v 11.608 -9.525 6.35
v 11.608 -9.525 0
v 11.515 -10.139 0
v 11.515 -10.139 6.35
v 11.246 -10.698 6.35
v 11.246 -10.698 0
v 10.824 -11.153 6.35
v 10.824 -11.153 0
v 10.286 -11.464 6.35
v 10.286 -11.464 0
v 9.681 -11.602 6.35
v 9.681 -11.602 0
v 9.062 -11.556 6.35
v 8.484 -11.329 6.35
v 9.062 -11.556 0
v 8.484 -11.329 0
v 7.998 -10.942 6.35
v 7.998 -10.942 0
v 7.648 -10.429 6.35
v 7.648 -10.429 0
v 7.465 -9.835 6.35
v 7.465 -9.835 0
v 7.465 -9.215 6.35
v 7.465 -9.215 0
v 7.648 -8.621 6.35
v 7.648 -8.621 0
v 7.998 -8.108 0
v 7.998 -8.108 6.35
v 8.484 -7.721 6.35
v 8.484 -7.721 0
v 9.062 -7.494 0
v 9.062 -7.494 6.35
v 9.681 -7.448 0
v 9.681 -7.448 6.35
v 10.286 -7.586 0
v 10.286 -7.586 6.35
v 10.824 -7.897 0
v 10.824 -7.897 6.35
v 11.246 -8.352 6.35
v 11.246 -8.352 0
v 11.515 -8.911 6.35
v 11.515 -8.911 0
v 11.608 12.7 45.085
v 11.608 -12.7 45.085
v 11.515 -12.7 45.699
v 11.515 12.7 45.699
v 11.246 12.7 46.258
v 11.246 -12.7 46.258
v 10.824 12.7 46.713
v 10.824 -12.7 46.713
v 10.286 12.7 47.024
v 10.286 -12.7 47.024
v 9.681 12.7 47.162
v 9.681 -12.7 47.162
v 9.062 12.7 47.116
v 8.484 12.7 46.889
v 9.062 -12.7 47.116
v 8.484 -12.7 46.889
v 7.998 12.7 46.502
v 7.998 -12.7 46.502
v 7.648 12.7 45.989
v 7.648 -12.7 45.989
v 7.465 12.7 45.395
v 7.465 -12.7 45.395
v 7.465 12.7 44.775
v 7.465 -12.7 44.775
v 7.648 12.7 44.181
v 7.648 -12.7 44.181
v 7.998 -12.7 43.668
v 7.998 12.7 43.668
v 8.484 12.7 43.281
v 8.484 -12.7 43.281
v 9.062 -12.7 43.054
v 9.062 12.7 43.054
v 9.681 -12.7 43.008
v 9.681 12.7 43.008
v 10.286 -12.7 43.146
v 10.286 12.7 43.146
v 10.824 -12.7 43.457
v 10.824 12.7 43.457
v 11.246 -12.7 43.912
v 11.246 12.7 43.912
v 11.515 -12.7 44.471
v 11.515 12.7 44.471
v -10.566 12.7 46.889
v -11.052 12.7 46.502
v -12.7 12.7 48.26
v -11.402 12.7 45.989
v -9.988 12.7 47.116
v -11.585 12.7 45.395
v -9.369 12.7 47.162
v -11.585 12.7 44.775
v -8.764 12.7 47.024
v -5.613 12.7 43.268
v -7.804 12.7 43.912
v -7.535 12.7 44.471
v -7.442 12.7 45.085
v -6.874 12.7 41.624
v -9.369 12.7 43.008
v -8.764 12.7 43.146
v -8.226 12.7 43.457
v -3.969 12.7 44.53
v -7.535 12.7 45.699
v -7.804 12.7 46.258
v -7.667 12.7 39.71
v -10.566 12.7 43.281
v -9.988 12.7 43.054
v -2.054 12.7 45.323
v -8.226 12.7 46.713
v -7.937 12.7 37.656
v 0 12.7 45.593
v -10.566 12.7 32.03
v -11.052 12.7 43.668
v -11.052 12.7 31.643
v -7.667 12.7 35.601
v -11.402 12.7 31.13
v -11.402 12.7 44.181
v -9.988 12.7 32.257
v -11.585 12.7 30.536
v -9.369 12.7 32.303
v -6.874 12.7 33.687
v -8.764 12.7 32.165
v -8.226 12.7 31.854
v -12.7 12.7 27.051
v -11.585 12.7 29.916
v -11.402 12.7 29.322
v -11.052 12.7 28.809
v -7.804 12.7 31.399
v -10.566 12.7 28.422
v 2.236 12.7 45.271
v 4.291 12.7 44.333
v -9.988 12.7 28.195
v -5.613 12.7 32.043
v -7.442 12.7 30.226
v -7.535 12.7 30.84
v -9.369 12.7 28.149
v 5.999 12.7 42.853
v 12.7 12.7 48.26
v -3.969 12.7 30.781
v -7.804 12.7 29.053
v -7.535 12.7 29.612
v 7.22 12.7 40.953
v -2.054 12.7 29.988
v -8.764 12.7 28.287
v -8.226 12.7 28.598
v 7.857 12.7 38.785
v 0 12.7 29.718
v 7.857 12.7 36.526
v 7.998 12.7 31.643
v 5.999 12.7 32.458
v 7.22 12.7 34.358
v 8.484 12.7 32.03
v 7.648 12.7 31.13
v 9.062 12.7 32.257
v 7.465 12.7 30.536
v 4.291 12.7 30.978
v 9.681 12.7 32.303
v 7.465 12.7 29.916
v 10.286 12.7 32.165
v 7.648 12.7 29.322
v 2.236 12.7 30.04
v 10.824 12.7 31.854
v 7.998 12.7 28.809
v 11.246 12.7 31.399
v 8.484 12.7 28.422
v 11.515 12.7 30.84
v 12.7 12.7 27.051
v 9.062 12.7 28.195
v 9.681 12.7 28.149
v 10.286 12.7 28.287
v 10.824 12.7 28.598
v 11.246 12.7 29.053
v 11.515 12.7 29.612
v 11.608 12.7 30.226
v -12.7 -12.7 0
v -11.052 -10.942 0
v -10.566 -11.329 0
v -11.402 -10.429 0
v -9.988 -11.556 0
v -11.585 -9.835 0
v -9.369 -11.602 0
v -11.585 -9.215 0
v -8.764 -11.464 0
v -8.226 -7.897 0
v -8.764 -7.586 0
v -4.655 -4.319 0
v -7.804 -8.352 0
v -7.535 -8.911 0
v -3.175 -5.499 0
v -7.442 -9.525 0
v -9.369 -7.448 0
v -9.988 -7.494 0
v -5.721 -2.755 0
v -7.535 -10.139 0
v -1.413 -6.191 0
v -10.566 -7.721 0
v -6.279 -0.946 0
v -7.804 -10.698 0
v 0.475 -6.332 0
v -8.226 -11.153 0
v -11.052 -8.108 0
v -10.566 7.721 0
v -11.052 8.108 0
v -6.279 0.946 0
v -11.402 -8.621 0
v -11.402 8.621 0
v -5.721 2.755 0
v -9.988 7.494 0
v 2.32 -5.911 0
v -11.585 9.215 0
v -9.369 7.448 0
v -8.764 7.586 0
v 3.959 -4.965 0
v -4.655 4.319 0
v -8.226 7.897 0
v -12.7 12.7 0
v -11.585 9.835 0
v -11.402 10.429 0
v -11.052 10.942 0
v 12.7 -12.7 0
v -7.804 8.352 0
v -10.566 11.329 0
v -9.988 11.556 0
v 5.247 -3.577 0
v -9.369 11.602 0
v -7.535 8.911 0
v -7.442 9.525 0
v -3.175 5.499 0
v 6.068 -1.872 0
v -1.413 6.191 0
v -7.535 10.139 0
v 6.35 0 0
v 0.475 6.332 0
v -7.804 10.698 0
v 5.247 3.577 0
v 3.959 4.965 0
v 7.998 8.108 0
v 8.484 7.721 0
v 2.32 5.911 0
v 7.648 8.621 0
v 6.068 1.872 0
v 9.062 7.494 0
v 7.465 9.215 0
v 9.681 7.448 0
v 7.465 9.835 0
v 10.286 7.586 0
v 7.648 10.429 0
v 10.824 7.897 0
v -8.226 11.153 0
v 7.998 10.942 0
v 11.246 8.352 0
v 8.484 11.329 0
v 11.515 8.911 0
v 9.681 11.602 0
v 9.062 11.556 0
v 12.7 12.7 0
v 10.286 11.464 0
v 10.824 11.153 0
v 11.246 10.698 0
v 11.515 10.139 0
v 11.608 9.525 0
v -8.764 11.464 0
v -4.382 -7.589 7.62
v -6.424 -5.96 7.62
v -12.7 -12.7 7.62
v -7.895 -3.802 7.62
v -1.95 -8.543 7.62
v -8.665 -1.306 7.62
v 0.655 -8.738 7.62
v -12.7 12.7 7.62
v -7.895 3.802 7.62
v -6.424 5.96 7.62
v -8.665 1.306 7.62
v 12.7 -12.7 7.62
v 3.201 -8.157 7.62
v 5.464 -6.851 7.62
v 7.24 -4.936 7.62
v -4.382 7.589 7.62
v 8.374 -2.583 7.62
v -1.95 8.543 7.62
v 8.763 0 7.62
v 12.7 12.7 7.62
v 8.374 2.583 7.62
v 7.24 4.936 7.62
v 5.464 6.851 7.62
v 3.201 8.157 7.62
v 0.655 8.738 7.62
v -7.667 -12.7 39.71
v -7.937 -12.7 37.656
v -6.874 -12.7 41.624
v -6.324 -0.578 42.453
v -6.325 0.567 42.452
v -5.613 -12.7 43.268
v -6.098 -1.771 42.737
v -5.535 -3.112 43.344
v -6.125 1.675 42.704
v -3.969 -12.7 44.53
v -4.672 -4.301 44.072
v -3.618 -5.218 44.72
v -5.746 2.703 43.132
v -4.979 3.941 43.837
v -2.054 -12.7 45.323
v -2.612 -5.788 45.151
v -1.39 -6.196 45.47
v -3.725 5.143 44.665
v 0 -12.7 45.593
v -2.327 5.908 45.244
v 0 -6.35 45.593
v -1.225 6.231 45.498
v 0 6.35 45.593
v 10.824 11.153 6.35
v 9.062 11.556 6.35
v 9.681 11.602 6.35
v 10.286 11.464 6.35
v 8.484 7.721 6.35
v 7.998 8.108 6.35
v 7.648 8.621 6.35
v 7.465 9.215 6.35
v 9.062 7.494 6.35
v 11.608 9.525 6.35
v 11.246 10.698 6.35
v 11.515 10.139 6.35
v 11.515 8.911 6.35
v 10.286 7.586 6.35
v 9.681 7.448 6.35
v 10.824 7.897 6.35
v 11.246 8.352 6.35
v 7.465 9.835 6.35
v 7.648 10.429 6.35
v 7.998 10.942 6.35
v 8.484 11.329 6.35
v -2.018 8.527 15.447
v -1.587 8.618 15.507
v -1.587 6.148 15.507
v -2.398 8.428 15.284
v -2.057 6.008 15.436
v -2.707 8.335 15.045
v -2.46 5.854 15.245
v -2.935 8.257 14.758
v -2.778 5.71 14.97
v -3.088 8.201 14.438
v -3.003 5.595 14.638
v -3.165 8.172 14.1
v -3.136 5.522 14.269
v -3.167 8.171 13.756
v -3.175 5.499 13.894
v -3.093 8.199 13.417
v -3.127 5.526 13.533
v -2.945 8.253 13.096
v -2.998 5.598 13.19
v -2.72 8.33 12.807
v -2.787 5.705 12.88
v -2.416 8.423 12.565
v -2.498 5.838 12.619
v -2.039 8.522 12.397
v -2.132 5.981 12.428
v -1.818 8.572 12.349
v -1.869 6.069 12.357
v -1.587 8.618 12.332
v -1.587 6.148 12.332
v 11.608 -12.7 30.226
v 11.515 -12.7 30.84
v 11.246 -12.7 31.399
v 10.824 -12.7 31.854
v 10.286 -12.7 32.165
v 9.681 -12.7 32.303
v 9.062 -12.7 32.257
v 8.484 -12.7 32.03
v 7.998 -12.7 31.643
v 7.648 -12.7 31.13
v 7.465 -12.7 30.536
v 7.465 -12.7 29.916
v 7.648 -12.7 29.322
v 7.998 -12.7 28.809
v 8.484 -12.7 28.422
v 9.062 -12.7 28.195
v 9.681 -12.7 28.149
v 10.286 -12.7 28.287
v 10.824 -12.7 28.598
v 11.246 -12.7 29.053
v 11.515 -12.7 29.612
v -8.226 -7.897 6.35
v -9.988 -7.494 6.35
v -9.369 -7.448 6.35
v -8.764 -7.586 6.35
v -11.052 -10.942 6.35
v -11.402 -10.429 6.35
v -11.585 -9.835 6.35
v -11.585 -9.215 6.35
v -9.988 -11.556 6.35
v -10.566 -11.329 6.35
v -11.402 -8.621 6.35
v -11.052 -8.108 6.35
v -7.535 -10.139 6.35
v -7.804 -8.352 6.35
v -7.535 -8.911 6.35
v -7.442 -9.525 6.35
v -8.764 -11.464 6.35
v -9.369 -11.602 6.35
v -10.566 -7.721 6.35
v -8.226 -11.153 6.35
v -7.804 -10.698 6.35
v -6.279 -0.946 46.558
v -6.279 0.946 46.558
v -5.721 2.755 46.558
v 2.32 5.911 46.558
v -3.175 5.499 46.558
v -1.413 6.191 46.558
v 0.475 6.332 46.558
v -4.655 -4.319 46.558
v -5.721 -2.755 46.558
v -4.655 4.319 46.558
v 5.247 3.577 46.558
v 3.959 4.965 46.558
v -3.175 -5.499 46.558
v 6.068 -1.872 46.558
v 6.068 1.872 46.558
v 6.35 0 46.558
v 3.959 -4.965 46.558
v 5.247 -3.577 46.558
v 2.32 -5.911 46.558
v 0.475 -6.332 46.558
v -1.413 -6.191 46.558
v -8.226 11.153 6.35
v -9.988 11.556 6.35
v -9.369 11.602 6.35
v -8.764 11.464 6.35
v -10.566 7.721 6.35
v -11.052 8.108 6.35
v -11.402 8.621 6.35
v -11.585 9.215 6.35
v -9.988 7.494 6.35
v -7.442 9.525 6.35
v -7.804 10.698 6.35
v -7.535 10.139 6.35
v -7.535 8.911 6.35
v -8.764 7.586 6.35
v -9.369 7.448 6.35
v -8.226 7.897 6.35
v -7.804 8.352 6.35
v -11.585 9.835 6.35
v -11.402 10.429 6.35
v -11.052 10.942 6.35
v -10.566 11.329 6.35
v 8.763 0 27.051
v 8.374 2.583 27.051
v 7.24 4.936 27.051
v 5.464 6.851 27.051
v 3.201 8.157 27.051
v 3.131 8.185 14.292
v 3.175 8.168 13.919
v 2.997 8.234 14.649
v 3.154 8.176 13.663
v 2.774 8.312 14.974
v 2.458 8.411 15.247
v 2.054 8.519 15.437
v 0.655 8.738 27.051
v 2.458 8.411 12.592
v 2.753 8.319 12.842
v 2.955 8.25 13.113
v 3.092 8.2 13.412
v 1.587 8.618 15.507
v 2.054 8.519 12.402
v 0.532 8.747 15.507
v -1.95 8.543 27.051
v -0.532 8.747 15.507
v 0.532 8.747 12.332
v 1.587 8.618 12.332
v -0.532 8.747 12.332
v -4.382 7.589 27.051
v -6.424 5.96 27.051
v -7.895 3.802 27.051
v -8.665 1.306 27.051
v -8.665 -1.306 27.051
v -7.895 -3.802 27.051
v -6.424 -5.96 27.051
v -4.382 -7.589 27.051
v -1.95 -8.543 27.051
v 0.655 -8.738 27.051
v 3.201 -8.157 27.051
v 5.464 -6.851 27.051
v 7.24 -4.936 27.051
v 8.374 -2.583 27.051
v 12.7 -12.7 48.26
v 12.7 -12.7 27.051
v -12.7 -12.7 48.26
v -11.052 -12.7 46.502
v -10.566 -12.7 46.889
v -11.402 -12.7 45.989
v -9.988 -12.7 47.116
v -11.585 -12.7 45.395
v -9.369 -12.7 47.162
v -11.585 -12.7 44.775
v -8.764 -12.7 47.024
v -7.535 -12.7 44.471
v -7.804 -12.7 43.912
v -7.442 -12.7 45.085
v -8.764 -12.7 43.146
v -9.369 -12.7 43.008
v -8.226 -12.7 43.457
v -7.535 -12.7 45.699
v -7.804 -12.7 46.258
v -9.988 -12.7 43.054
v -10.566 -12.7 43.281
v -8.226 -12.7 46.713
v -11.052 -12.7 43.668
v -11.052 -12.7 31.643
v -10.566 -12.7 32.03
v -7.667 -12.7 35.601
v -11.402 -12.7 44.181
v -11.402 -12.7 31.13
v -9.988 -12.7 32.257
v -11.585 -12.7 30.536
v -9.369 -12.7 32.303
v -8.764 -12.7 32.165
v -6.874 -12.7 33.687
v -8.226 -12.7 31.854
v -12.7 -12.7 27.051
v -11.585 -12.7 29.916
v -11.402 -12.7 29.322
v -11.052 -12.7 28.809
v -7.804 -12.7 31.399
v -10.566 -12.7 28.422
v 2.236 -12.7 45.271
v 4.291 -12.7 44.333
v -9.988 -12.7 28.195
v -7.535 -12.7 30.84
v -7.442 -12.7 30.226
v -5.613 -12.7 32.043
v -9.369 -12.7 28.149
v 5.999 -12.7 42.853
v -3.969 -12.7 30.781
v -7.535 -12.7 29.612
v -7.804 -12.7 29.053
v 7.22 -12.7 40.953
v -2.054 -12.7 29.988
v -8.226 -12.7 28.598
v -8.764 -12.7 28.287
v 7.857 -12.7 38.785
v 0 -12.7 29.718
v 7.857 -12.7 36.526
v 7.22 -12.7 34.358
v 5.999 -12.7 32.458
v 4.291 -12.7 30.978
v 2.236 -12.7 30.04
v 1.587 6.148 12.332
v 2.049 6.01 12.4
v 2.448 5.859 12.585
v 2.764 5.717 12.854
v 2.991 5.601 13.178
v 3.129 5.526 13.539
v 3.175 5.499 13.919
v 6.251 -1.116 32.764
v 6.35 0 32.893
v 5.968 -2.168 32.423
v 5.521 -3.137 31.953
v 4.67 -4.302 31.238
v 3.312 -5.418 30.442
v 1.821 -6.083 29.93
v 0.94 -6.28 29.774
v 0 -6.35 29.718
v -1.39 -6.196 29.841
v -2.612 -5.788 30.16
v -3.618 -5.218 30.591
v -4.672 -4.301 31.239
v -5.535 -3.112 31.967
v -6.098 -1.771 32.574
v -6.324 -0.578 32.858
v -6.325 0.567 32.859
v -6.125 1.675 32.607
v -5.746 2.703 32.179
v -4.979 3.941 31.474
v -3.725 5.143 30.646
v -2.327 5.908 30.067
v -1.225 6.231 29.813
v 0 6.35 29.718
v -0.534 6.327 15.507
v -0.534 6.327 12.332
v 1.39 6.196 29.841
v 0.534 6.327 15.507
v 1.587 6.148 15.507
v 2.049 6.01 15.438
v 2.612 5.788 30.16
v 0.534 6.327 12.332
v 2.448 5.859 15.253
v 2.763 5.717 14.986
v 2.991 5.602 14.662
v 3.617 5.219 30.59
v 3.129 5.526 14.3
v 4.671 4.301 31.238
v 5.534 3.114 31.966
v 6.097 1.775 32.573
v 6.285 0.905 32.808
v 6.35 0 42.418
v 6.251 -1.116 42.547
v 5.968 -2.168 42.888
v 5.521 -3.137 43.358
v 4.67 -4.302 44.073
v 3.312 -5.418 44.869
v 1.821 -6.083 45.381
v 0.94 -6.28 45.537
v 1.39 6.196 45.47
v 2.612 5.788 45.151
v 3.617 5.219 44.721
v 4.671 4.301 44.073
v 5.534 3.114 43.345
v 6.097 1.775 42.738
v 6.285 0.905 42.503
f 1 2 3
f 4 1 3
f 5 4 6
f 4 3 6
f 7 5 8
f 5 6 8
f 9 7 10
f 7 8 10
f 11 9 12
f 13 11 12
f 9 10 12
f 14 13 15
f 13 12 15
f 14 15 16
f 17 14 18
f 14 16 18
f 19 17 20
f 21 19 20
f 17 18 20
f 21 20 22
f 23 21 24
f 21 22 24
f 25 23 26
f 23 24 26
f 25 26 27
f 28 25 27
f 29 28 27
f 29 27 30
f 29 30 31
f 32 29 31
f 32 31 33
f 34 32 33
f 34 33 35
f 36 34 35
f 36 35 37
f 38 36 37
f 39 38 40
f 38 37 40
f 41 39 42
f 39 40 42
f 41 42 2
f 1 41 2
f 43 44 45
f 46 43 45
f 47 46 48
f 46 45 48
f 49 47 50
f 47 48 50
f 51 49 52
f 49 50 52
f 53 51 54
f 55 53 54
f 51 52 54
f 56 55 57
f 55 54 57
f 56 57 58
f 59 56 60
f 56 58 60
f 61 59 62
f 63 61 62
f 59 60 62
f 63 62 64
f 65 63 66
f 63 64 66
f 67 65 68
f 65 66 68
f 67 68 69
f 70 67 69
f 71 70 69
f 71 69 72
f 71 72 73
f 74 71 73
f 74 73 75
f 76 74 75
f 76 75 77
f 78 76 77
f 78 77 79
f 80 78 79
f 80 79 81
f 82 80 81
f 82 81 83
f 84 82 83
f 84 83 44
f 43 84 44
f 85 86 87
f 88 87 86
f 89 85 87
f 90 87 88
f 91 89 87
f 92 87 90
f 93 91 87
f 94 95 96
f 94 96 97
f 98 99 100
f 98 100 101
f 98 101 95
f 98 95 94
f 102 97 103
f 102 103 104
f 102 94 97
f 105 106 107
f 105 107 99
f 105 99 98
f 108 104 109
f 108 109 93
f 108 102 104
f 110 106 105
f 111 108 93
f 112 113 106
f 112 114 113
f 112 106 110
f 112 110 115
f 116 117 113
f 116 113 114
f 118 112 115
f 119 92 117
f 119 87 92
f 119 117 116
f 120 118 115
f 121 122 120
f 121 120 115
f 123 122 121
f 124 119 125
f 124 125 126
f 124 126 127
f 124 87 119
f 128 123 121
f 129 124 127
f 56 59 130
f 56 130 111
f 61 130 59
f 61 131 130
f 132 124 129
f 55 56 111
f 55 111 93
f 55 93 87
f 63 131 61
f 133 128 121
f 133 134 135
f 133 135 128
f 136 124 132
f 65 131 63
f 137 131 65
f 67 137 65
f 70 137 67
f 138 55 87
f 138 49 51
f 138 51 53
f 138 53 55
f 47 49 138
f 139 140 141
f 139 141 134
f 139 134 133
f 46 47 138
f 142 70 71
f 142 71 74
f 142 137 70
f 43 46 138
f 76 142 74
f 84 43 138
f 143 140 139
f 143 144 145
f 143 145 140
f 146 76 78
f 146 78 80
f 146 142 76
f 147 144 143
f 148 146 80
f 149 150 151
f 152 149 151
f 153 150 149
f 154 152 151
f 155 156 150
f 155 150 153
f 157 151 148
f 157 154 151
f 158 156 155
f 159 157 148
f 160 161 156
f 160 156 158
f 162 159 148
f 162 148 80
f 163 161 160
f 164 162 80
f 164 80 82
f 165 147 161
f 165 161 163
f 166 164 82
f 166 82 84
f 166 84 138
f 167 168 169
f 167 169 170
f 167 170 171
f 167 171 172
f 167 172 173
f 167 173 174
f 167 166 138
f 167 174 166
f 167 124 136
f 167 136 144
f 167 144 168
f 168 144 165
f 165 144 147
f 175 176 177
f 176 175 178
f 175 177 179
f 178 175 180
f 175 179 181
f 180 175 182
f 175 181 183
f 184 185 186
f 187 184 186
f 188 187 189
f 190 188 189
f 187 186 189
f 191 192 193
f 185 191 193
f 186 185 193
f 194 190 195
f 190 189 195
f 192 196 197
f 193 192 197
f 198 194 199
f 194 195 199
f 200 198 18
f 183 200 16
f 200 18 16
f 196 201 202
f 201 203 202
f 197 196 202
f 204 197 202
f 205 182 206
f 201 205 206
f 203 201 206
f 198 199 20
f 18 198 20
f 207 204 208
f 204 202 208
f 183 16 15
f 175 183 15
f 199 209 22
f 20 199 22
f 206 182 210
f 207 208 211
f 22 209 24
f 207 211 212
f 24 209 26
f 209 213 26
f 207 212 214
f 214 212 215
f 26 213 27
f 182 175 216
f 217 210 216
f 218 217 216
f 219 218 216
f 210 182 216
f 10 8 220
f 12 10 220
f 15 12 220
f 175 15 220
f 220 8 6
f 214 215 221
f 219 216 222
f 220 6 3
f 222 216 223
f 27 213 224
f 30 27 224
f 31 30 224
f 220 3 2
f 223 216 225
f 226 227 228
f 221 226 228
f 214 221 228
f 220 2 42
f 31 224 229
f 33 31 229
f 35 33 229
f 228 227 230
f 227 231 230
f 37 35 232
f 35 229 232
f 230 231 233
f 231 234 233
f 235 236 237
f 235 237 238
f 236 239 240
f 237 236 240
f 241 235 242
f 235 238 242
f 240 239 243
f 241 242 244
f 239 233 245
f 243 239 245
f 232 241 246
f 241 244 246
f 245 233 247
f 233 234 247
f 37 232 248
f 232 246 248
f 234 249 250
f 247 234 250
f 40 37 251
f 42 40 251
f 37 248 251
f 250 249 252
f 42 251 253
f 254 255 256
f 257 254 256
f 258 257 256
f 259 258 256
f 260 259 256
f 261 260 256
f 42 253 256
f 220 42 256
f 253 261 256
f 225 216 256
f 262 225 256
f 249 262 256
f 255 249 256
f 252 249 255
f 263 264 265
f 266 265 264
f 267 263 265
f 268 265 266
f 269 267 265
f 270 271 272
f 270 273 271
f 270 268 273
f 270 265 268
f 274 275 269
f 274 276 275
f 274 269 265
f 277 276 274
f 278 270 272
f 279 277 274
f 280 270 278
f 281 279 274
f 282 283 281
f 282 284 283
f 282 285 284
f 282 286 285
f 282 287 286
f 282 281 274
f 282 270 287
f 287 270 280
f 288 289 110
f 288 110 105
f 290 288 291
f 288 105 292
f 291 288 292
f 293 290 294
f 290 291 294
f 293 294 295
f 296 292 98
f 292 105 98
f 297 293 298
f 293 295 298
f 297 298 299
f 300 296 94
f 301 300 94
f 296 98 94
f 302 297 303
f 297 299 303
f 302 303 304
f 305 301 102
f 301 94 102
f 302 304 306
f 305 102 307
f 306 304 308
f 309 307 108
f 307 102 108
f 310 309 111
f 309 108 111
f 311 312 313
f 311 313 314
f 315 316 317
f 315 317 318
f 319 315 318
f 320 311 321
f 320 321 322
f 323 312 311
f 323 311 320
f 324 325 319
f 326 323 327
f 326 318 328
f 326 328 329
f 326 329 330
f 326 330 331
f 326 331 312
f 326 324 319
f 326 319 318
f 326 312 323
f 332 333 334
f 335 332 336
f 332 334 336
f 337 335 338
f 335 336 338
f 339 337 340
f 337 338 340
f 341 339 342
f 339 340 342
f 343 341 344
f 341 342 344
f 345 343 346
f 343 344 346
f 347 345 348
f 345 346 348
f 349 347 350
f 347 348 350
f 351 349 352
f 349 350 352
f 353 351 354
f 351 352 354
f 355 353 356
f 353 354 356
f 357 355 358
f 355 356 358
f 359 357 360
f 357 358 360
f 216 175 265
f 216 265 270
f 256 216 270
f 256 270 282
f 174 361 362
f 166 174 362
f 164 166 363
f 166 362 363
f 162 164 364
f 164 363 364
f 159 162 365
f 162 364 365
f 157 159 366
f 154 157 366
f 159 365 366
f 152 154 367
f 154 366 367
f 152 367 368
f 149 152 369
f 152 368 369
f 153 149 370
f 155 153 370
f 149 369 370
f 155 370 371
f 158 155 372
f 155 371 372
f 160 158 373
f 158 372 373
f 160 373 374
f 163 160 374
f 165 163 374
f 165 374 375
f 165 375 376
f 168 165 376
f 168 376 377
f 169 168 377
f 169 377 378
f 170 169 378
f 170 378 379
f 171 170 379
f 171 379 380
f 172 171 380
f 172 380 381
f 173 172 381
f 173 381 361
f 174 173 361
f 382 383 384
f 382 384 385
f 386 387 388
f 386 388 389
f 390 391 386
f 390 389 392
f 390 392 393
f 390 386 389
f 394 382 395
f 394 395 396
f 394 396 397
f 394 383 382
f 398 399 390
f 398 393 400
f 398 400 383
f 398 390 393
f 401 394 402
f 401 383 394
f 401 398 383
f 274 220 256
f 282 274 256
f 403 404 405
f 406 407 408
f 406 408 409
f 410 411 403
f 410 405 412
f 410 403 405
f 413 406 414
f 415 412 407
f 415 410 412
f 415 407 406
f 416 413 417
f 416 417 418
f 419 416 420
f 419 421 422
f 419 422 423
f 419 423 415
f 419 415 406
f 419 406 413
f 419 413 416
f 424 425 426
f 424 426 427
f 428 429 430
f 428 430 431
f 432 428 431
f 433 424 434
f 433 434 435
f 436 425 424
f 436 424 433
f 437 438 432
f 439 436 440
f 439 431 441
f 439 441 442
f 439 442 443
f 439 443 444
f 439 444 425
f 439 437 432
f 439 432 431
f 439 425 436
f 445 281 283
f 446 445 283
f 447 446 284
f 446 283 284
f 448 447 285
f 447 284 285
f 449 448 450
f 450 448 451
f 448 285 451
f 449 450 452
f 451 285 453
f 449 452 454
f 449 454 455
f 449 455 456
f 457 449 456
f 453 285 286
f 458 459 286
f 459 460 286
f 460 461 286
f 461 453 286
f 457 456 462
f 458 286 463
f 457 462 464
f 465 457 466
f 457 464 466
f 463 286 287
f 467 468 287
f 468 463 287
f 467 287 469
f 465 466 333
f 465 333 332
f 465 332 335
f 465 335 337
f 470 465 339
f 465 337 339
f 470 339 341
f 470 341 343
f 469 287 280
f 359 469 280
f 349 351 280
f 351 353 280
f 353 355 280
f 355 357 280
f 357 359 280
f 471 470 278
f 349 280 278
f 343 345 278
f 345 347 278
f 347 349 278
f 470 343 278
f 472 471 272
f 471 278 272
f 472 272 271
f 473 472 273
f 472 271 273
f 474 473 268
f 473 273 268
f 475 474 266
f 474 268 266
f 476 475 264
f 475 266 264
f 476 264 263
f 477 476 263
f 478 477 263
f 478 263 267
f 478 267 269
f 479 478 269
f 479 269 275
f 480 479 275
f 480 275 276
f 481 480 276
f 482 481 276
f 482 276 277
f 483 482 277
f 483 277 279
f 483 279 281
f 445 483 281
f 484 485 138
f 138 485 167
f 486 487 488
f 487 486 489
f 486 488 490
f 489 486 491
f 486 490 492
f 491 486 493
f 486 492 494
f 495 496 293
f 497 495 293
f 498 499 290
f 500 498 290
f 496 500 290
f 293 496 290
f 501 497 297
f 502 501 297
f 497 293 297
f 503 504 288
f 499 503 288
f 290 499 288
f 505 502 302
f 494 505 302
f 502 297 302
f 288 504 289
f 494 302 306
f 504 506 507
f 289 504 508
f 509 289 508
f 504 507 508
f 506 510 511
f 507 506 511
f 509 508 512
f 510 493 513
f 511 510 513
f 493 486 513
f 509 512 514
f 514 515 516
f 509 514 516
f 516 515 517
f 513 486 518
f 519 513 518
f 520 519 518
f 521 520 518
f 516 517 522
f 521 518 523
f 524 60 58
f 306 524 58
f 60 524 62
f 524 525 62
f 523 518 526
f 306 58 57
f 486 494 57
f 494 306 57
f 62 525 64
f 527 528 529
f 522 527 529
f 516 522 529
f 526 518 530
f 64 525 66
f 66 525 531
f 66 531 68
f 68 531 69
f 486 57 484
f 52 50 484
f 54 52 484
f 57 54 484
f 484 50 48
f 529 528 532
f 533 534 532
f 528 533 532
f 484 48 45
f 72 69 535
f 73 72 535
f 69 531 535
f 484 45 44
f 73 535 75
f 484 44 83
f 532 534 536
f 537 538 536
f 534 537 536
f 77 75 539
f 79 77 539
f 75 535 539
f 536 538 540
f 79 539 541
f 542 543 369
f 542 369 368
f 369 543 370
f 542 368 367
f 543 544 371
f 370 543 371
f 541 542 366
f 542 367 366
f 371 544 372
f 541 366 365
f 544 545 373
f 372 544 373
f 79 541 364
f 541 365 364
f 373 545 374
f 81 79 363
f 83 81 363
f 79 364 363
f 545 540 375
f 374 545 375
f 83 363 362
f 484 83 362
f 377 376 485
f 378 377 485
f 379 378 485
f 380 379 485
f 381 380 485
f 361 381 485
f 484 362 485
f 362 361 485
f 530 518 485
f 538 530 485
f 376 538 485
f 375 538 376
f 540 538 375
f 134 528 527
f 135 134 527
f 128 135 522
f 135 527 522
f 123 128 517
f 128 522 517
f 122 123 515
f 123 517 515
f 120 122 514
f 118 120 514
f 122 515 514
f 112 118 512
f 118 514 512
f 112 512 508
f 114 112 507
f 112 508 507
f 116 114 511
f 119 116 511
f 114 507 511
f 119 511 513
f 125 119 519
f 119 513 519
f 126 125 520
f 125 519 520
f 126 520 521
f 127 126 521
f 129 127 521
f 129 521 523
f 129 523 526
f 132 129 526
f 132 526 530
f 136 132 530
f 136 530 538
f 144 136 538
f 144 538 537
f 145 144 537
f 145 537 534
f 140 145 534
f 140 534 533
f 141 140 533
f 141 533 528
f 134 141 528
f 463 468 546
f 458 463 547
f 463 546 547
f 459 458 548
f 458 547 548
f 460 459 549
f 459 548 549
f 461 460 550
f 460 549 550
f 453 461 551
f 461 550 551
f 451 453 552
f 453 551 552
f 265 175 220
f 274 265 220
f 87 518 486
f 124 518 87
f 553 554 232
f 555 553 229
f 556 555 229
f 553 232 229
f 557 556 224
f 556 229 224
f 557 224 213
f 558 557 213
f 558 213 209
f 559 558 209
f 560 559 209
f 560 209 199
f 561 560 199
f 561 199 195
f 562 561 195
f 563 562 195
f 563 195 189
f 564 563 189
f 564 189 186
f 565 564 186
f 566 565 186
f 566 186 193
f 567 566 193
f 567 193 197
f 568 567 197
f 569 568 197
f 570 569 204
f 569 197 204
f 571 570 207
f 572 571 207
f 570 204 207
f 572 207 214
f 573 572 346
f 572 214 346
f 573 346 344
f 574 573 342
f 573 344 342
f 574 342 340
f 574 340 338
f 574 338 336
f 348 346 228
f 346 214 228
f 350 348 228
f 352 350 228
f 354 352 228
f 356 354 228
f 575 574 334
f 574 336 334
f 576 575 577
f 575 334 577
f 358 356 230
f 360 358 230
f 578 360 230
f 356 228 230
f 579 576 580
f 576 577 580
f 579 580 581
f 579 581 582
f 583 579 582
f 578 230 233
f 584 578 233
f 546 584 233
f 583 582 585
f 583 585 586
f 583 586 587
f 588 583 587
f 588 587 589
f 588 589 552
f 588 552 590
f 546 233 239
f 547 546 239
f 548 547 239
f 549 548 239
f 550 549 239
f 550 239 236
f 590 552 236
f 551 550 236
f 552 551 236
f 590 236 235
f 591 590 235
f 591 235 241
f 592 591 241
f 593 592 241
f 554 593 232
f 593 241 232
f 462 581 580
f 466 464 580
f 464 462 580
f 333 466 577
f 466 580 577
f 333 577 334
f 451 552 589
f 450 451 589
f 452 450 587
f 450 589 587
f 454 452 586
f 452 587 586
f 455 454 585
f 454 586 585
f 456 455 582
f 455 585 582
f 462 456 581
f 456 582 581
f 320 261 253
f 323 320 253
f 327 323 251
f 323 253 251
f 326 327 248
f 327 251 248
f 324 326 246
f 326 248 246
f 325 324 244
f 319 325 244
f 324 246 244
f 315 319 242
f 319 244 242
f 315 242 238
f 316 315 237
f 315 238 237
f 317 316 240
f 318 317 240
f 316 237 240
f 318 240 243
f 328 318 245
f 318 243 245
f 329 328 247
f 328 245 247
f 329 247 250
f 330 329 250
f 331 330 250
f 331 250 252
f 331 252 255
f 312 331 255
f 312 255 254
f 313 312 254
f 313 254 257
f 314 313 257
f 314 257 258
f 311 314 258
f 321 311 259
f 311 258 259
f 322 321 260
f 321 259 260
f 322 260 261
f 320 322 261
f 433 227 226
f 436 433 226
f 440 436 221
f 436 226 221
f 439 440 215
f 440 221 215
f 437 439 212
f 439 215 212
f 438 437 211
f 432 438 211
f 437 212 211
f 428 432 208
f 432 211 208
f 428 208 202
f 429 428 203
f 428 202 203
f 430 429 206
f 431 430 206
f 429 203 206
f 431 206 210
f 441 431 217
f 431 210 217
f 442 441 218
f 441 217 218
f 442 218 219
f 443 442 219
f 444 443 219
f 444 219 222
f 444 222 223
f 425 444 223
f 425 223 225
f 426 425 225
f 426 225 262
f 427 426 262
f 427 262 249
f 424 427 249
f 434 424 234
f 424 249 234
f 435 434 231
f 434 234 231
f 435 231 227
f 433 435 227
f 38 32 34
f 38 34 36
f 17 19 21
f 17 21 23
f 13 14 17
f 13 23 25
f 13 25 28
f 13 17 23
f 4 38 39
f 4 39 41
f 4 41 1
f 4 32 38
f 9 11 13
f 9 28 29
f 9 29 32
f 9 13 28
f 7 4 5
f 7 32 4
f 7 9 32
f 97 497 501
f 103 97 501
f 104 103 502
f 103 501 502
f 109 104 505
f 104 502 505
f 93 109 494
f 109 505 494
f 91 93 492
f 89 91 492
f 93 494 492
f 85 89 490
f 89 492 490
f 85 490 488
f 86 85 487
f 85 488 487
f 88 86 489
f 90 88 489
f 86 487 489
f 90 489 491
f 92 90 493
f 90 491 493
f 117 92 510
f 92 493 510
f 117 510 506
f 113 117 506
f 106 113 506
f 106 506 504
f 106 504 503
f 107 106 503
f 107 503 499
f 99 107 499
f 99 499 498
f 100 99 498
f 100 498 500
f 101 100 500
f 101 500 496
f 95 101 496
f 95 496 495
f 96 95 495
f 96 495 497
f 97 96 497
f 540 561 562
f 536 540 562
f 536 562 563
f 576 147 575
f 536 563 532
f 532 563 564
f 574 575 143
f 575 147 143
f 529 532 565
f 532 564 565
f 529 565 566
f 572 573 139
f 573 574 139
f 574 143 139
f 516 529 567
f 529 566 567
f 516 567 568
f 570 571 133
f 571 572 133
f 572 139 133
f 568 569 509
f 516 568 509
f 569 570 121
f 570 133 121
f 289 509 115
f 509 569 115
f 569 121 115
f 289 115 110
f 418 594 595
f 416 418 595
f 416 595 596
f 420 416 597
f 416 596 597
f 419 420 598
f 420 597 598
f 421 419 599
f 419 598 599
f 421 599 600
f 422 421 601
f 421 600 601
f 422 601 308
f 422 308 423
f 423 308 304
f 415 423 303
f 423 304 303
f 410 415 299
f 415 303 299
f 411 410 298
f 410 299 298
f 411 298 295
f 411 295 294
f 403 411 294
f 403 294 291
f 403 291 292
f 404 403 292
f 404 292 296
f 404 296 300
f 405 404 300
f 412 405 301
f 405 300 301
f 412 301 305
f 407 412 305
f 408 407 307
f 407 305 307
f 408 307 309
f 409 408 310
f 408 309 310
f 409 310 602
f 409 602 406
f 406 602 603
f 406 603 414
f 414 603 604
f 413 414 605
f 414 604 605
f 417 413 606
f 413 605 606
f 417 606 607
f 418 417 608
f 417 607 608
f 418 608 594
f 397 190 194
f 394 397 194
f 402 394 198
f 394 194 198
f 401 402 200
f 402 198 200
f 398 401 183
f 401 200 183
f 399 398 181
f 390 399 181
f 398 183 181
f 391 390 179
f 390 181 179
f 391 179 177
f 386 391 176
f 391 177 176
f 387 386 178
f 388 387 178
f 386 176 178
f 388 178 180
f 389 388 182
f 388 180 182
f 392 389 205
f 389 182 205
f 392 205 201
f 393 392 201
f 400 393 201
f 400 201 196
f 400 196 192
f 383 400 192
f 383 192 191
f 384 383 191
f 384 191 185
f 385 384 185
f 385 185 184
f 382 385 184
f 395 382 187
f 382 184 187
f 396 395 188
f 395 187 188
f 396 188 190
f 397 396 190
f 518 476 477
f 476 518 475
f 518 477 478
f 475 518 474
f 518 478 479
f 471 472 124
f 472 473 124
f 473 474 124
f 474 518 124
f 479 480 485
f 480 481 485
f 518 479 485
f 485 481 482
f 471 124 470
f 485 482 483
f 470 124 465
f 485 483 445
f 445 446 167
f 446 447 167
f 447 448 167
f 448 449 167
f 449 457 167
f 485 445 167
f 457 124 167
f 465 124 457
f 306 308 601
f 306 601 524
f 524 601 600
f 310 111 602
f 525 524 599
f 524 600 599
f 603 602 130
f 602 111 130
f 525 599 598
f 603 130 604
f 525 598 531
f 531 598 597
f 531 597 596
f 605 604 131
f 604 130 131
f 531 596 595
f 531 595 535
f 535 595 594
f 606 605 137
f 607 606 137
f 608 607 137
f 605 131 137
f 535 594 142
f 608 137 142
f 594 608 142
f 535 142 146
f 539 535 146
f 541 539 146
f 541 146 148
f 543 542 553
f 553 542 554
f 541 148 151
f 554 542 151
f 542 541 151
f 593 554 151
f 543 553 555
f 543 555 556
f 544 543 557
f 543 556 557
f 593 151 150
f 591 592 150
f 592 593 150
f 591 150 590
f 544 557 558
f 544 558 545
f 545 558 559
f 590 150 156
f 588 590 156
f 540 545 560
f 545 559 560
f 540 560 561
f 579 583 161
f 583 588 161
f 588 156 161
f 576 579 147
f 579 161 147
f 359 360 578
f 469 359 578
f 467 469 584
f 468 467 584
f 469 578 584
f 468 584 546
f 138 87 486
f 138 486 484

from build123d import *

# Parameters (mm, degrees)
F0_W      = 25.4
F0_H      = 25.4
F1_DEPTH  = 7.62
F2_R      = 8.763
F3_DEPTH  = 19.431
F4_W      = 25.4
F4_H      = 25.4
F5_DEPTH  = 21.209
F6_R      = 6.35
F7_DEPTH  = 46.5582
F8_R      = 2.0828
F9_DEPTH  = 25.401
F11_DEPTH = 25.401
F13_DEPTH = 25.4
F14_R     = 2.0828
F15_DEPTH = 6.35


with BuildPart() as f1:
    # F0 (on Top) → F1 (new body)
    with BuildSketch(Plane.XY):
        Rectangle(F0_W, F0_H)
    extrude(amount=F1_DEPTH)

    # F2 (on face) → F3 (join)
    with BuildSketch(Plane.XY.offset(7.62)):
        Circle(F2_R)
    extrude(amount=F3_DEPTH)

    # F4 (on face) → F5 (join)
    with BuildSketch(Plane.XY.offset(27.051)):
        Rectangle(F4_W, F4_H)
    extrude(amount=F5_DEPTH)

    # F6 (on face) → F7 (cut)
    with BuildSketch(Plane(origin=(0, 0, 0), x_dir=(1, 0, 0), z_dir=(0, 0, -1))):
        Circle(F6_R)
    extrude(amount=-F7_DEPTH, mode=Mode.SUBTRACT)

    # F8 (on face) → F9 (cut, through all)
    with BuildSketch(Plane.XZ.offset(12.7)):
        with Locations((-9.525, 45.085)):
            Circle(F8_R)
        with Locations((9.525, 45.085)):
            Circle(F8_R)
        with Locations((-9.525, 30.226)):
            Circle(F8_R)
        with Locations((9.525, 30.226)):
            Circle(F8_R)
    extrude(amount=-F9_DEPTH, mode=Mode.SUBTRACT)

    # F10 (on face) → F11 (cut, through all)
    with BuildSketch(Plane(origin=(0, 12.7, 0), x_dir=(-1, 0, 0), z_dir=(0, 1, 0))):
        with BuildLine():
            ThreePointArc((7.9375, 37.6555), (5.6126600757, 43.2681600757), (0, 45.593))
            Line((0, 45.593), (0, 29.718))
            ThreePointArc((0, 29.718), (5.6126600757, 32.0428399243), (7.9375, 37.6555))
        make_face()
        with BuildLine():
            Line((0, 29.718), (0, 45.593))
            ThreePointArc((0, 45.593), (-7.9375, 37.6555), (0, 29.718))
        make_face()
    extrude(amount=-F11_DEPTH, mode=Mode.SUBTRACT)

    # F12 (on Front) → F13 (cut)
    with BuildSketch(Plane.XZ):
        with BuildLine():
            Line((-1.5875, 12.3317), (0, 12.3317))
            Line((0, 12.3317), (0, 13.9192))
            ThreePointArc((0, 13.9192), (-0.4649679849, 12.7966679849), (-1.5875, 12.3317))
        make_face()
        with BuildLine():
            Line((0, 13.9192), (0, 12.3317))
            Line((0, 12.3317), (1.5875, 12.3317))
            ThreePointArc((1.5875, 12.3317), (0.4649679849, 12.7966679849), (0, 13.9192))
        make_face()
        with BuildLine():
            ThreePointArc((1.5875, 15.5067), (0.4649679849, 15.0417320151), (0, 13.9192))
            Line((0, 13.9192), (1.5875, 13.9192))
            Line((1.5875, 13.9192), (1.5875, 15.5067))
        make_face()
        with BuildLine():
            ThreePointArc((-1.5875, 15.5067), (-0.4649679849, 15.0417320151), (0, 13.9192))
            ThreePointArc((0, 13.9192), (0.4649679849, 15.0417320151), (1.5875, 15.5067))
            Line((1.5875, 15.5067), (-1.5875, 15.5067))
        make_face()
        with BuildLine():
            Line((1.5875, 13.9192), (0, 13.9192))
            ThreePointArc((0, 13.9192), (0.4649679849, 12.7966679849), (1.5875, 12.3317))
            Line((1.5875, 12.3317), (1.5875, 13.9192))
        make_face()
        with BuildLine():
            ThreePointArc((-1.5875, 12.3317), (-0.4649679849, 12.7966679849), (0, 13.9192))
            ThreePointArc((0, 13.9192), (-0.4649679849, 15.0417320151), (-1.5875, 15.5067))
            ThreePointArc((-1.5875, 15.5067), (-3.175, 13.9192), (-1.5875, 12.3317))
        make_face()
        with BuildLine():
            Line((1.5875, 13.9192), (1.5875, 12.3317))
            ThreePointArc((1.5875, 12.3317), (2.7100320151, 12.7966679849), (3.175, 13.9192))
            ThreePointArc((3.175, 13.9192), (2.7100320151, 15.0417320151), (1.5875, 15.5067))
            Line((1.5875, 15.5067), (1.5875, 13.9192))
        make_face()
    extrude(amount=-F13_DEPTH, mode=Mode.SUBTRACT)

    # F14 (on face) → F15 (cut)
    with BuildSketch(Plane(origin=(0, 0, 0), x_dir=(1, 0, 0), z_dir=(0, 0, -1))):
        with Locations((-9.525, 9.525)):
            Circle(F14_R)
        with Locations((-9.525, -9.525)):
            Circle(F14_R)
        with Locations((9.525, 9.525)):
            Circle(F14_R)
        with Locations((9.525, -9.525)):
            Circle(F14_R)
    extrude(amount=-F15_DEPTH, mode=Mode.SUBTRACT)


solid = f1.part
